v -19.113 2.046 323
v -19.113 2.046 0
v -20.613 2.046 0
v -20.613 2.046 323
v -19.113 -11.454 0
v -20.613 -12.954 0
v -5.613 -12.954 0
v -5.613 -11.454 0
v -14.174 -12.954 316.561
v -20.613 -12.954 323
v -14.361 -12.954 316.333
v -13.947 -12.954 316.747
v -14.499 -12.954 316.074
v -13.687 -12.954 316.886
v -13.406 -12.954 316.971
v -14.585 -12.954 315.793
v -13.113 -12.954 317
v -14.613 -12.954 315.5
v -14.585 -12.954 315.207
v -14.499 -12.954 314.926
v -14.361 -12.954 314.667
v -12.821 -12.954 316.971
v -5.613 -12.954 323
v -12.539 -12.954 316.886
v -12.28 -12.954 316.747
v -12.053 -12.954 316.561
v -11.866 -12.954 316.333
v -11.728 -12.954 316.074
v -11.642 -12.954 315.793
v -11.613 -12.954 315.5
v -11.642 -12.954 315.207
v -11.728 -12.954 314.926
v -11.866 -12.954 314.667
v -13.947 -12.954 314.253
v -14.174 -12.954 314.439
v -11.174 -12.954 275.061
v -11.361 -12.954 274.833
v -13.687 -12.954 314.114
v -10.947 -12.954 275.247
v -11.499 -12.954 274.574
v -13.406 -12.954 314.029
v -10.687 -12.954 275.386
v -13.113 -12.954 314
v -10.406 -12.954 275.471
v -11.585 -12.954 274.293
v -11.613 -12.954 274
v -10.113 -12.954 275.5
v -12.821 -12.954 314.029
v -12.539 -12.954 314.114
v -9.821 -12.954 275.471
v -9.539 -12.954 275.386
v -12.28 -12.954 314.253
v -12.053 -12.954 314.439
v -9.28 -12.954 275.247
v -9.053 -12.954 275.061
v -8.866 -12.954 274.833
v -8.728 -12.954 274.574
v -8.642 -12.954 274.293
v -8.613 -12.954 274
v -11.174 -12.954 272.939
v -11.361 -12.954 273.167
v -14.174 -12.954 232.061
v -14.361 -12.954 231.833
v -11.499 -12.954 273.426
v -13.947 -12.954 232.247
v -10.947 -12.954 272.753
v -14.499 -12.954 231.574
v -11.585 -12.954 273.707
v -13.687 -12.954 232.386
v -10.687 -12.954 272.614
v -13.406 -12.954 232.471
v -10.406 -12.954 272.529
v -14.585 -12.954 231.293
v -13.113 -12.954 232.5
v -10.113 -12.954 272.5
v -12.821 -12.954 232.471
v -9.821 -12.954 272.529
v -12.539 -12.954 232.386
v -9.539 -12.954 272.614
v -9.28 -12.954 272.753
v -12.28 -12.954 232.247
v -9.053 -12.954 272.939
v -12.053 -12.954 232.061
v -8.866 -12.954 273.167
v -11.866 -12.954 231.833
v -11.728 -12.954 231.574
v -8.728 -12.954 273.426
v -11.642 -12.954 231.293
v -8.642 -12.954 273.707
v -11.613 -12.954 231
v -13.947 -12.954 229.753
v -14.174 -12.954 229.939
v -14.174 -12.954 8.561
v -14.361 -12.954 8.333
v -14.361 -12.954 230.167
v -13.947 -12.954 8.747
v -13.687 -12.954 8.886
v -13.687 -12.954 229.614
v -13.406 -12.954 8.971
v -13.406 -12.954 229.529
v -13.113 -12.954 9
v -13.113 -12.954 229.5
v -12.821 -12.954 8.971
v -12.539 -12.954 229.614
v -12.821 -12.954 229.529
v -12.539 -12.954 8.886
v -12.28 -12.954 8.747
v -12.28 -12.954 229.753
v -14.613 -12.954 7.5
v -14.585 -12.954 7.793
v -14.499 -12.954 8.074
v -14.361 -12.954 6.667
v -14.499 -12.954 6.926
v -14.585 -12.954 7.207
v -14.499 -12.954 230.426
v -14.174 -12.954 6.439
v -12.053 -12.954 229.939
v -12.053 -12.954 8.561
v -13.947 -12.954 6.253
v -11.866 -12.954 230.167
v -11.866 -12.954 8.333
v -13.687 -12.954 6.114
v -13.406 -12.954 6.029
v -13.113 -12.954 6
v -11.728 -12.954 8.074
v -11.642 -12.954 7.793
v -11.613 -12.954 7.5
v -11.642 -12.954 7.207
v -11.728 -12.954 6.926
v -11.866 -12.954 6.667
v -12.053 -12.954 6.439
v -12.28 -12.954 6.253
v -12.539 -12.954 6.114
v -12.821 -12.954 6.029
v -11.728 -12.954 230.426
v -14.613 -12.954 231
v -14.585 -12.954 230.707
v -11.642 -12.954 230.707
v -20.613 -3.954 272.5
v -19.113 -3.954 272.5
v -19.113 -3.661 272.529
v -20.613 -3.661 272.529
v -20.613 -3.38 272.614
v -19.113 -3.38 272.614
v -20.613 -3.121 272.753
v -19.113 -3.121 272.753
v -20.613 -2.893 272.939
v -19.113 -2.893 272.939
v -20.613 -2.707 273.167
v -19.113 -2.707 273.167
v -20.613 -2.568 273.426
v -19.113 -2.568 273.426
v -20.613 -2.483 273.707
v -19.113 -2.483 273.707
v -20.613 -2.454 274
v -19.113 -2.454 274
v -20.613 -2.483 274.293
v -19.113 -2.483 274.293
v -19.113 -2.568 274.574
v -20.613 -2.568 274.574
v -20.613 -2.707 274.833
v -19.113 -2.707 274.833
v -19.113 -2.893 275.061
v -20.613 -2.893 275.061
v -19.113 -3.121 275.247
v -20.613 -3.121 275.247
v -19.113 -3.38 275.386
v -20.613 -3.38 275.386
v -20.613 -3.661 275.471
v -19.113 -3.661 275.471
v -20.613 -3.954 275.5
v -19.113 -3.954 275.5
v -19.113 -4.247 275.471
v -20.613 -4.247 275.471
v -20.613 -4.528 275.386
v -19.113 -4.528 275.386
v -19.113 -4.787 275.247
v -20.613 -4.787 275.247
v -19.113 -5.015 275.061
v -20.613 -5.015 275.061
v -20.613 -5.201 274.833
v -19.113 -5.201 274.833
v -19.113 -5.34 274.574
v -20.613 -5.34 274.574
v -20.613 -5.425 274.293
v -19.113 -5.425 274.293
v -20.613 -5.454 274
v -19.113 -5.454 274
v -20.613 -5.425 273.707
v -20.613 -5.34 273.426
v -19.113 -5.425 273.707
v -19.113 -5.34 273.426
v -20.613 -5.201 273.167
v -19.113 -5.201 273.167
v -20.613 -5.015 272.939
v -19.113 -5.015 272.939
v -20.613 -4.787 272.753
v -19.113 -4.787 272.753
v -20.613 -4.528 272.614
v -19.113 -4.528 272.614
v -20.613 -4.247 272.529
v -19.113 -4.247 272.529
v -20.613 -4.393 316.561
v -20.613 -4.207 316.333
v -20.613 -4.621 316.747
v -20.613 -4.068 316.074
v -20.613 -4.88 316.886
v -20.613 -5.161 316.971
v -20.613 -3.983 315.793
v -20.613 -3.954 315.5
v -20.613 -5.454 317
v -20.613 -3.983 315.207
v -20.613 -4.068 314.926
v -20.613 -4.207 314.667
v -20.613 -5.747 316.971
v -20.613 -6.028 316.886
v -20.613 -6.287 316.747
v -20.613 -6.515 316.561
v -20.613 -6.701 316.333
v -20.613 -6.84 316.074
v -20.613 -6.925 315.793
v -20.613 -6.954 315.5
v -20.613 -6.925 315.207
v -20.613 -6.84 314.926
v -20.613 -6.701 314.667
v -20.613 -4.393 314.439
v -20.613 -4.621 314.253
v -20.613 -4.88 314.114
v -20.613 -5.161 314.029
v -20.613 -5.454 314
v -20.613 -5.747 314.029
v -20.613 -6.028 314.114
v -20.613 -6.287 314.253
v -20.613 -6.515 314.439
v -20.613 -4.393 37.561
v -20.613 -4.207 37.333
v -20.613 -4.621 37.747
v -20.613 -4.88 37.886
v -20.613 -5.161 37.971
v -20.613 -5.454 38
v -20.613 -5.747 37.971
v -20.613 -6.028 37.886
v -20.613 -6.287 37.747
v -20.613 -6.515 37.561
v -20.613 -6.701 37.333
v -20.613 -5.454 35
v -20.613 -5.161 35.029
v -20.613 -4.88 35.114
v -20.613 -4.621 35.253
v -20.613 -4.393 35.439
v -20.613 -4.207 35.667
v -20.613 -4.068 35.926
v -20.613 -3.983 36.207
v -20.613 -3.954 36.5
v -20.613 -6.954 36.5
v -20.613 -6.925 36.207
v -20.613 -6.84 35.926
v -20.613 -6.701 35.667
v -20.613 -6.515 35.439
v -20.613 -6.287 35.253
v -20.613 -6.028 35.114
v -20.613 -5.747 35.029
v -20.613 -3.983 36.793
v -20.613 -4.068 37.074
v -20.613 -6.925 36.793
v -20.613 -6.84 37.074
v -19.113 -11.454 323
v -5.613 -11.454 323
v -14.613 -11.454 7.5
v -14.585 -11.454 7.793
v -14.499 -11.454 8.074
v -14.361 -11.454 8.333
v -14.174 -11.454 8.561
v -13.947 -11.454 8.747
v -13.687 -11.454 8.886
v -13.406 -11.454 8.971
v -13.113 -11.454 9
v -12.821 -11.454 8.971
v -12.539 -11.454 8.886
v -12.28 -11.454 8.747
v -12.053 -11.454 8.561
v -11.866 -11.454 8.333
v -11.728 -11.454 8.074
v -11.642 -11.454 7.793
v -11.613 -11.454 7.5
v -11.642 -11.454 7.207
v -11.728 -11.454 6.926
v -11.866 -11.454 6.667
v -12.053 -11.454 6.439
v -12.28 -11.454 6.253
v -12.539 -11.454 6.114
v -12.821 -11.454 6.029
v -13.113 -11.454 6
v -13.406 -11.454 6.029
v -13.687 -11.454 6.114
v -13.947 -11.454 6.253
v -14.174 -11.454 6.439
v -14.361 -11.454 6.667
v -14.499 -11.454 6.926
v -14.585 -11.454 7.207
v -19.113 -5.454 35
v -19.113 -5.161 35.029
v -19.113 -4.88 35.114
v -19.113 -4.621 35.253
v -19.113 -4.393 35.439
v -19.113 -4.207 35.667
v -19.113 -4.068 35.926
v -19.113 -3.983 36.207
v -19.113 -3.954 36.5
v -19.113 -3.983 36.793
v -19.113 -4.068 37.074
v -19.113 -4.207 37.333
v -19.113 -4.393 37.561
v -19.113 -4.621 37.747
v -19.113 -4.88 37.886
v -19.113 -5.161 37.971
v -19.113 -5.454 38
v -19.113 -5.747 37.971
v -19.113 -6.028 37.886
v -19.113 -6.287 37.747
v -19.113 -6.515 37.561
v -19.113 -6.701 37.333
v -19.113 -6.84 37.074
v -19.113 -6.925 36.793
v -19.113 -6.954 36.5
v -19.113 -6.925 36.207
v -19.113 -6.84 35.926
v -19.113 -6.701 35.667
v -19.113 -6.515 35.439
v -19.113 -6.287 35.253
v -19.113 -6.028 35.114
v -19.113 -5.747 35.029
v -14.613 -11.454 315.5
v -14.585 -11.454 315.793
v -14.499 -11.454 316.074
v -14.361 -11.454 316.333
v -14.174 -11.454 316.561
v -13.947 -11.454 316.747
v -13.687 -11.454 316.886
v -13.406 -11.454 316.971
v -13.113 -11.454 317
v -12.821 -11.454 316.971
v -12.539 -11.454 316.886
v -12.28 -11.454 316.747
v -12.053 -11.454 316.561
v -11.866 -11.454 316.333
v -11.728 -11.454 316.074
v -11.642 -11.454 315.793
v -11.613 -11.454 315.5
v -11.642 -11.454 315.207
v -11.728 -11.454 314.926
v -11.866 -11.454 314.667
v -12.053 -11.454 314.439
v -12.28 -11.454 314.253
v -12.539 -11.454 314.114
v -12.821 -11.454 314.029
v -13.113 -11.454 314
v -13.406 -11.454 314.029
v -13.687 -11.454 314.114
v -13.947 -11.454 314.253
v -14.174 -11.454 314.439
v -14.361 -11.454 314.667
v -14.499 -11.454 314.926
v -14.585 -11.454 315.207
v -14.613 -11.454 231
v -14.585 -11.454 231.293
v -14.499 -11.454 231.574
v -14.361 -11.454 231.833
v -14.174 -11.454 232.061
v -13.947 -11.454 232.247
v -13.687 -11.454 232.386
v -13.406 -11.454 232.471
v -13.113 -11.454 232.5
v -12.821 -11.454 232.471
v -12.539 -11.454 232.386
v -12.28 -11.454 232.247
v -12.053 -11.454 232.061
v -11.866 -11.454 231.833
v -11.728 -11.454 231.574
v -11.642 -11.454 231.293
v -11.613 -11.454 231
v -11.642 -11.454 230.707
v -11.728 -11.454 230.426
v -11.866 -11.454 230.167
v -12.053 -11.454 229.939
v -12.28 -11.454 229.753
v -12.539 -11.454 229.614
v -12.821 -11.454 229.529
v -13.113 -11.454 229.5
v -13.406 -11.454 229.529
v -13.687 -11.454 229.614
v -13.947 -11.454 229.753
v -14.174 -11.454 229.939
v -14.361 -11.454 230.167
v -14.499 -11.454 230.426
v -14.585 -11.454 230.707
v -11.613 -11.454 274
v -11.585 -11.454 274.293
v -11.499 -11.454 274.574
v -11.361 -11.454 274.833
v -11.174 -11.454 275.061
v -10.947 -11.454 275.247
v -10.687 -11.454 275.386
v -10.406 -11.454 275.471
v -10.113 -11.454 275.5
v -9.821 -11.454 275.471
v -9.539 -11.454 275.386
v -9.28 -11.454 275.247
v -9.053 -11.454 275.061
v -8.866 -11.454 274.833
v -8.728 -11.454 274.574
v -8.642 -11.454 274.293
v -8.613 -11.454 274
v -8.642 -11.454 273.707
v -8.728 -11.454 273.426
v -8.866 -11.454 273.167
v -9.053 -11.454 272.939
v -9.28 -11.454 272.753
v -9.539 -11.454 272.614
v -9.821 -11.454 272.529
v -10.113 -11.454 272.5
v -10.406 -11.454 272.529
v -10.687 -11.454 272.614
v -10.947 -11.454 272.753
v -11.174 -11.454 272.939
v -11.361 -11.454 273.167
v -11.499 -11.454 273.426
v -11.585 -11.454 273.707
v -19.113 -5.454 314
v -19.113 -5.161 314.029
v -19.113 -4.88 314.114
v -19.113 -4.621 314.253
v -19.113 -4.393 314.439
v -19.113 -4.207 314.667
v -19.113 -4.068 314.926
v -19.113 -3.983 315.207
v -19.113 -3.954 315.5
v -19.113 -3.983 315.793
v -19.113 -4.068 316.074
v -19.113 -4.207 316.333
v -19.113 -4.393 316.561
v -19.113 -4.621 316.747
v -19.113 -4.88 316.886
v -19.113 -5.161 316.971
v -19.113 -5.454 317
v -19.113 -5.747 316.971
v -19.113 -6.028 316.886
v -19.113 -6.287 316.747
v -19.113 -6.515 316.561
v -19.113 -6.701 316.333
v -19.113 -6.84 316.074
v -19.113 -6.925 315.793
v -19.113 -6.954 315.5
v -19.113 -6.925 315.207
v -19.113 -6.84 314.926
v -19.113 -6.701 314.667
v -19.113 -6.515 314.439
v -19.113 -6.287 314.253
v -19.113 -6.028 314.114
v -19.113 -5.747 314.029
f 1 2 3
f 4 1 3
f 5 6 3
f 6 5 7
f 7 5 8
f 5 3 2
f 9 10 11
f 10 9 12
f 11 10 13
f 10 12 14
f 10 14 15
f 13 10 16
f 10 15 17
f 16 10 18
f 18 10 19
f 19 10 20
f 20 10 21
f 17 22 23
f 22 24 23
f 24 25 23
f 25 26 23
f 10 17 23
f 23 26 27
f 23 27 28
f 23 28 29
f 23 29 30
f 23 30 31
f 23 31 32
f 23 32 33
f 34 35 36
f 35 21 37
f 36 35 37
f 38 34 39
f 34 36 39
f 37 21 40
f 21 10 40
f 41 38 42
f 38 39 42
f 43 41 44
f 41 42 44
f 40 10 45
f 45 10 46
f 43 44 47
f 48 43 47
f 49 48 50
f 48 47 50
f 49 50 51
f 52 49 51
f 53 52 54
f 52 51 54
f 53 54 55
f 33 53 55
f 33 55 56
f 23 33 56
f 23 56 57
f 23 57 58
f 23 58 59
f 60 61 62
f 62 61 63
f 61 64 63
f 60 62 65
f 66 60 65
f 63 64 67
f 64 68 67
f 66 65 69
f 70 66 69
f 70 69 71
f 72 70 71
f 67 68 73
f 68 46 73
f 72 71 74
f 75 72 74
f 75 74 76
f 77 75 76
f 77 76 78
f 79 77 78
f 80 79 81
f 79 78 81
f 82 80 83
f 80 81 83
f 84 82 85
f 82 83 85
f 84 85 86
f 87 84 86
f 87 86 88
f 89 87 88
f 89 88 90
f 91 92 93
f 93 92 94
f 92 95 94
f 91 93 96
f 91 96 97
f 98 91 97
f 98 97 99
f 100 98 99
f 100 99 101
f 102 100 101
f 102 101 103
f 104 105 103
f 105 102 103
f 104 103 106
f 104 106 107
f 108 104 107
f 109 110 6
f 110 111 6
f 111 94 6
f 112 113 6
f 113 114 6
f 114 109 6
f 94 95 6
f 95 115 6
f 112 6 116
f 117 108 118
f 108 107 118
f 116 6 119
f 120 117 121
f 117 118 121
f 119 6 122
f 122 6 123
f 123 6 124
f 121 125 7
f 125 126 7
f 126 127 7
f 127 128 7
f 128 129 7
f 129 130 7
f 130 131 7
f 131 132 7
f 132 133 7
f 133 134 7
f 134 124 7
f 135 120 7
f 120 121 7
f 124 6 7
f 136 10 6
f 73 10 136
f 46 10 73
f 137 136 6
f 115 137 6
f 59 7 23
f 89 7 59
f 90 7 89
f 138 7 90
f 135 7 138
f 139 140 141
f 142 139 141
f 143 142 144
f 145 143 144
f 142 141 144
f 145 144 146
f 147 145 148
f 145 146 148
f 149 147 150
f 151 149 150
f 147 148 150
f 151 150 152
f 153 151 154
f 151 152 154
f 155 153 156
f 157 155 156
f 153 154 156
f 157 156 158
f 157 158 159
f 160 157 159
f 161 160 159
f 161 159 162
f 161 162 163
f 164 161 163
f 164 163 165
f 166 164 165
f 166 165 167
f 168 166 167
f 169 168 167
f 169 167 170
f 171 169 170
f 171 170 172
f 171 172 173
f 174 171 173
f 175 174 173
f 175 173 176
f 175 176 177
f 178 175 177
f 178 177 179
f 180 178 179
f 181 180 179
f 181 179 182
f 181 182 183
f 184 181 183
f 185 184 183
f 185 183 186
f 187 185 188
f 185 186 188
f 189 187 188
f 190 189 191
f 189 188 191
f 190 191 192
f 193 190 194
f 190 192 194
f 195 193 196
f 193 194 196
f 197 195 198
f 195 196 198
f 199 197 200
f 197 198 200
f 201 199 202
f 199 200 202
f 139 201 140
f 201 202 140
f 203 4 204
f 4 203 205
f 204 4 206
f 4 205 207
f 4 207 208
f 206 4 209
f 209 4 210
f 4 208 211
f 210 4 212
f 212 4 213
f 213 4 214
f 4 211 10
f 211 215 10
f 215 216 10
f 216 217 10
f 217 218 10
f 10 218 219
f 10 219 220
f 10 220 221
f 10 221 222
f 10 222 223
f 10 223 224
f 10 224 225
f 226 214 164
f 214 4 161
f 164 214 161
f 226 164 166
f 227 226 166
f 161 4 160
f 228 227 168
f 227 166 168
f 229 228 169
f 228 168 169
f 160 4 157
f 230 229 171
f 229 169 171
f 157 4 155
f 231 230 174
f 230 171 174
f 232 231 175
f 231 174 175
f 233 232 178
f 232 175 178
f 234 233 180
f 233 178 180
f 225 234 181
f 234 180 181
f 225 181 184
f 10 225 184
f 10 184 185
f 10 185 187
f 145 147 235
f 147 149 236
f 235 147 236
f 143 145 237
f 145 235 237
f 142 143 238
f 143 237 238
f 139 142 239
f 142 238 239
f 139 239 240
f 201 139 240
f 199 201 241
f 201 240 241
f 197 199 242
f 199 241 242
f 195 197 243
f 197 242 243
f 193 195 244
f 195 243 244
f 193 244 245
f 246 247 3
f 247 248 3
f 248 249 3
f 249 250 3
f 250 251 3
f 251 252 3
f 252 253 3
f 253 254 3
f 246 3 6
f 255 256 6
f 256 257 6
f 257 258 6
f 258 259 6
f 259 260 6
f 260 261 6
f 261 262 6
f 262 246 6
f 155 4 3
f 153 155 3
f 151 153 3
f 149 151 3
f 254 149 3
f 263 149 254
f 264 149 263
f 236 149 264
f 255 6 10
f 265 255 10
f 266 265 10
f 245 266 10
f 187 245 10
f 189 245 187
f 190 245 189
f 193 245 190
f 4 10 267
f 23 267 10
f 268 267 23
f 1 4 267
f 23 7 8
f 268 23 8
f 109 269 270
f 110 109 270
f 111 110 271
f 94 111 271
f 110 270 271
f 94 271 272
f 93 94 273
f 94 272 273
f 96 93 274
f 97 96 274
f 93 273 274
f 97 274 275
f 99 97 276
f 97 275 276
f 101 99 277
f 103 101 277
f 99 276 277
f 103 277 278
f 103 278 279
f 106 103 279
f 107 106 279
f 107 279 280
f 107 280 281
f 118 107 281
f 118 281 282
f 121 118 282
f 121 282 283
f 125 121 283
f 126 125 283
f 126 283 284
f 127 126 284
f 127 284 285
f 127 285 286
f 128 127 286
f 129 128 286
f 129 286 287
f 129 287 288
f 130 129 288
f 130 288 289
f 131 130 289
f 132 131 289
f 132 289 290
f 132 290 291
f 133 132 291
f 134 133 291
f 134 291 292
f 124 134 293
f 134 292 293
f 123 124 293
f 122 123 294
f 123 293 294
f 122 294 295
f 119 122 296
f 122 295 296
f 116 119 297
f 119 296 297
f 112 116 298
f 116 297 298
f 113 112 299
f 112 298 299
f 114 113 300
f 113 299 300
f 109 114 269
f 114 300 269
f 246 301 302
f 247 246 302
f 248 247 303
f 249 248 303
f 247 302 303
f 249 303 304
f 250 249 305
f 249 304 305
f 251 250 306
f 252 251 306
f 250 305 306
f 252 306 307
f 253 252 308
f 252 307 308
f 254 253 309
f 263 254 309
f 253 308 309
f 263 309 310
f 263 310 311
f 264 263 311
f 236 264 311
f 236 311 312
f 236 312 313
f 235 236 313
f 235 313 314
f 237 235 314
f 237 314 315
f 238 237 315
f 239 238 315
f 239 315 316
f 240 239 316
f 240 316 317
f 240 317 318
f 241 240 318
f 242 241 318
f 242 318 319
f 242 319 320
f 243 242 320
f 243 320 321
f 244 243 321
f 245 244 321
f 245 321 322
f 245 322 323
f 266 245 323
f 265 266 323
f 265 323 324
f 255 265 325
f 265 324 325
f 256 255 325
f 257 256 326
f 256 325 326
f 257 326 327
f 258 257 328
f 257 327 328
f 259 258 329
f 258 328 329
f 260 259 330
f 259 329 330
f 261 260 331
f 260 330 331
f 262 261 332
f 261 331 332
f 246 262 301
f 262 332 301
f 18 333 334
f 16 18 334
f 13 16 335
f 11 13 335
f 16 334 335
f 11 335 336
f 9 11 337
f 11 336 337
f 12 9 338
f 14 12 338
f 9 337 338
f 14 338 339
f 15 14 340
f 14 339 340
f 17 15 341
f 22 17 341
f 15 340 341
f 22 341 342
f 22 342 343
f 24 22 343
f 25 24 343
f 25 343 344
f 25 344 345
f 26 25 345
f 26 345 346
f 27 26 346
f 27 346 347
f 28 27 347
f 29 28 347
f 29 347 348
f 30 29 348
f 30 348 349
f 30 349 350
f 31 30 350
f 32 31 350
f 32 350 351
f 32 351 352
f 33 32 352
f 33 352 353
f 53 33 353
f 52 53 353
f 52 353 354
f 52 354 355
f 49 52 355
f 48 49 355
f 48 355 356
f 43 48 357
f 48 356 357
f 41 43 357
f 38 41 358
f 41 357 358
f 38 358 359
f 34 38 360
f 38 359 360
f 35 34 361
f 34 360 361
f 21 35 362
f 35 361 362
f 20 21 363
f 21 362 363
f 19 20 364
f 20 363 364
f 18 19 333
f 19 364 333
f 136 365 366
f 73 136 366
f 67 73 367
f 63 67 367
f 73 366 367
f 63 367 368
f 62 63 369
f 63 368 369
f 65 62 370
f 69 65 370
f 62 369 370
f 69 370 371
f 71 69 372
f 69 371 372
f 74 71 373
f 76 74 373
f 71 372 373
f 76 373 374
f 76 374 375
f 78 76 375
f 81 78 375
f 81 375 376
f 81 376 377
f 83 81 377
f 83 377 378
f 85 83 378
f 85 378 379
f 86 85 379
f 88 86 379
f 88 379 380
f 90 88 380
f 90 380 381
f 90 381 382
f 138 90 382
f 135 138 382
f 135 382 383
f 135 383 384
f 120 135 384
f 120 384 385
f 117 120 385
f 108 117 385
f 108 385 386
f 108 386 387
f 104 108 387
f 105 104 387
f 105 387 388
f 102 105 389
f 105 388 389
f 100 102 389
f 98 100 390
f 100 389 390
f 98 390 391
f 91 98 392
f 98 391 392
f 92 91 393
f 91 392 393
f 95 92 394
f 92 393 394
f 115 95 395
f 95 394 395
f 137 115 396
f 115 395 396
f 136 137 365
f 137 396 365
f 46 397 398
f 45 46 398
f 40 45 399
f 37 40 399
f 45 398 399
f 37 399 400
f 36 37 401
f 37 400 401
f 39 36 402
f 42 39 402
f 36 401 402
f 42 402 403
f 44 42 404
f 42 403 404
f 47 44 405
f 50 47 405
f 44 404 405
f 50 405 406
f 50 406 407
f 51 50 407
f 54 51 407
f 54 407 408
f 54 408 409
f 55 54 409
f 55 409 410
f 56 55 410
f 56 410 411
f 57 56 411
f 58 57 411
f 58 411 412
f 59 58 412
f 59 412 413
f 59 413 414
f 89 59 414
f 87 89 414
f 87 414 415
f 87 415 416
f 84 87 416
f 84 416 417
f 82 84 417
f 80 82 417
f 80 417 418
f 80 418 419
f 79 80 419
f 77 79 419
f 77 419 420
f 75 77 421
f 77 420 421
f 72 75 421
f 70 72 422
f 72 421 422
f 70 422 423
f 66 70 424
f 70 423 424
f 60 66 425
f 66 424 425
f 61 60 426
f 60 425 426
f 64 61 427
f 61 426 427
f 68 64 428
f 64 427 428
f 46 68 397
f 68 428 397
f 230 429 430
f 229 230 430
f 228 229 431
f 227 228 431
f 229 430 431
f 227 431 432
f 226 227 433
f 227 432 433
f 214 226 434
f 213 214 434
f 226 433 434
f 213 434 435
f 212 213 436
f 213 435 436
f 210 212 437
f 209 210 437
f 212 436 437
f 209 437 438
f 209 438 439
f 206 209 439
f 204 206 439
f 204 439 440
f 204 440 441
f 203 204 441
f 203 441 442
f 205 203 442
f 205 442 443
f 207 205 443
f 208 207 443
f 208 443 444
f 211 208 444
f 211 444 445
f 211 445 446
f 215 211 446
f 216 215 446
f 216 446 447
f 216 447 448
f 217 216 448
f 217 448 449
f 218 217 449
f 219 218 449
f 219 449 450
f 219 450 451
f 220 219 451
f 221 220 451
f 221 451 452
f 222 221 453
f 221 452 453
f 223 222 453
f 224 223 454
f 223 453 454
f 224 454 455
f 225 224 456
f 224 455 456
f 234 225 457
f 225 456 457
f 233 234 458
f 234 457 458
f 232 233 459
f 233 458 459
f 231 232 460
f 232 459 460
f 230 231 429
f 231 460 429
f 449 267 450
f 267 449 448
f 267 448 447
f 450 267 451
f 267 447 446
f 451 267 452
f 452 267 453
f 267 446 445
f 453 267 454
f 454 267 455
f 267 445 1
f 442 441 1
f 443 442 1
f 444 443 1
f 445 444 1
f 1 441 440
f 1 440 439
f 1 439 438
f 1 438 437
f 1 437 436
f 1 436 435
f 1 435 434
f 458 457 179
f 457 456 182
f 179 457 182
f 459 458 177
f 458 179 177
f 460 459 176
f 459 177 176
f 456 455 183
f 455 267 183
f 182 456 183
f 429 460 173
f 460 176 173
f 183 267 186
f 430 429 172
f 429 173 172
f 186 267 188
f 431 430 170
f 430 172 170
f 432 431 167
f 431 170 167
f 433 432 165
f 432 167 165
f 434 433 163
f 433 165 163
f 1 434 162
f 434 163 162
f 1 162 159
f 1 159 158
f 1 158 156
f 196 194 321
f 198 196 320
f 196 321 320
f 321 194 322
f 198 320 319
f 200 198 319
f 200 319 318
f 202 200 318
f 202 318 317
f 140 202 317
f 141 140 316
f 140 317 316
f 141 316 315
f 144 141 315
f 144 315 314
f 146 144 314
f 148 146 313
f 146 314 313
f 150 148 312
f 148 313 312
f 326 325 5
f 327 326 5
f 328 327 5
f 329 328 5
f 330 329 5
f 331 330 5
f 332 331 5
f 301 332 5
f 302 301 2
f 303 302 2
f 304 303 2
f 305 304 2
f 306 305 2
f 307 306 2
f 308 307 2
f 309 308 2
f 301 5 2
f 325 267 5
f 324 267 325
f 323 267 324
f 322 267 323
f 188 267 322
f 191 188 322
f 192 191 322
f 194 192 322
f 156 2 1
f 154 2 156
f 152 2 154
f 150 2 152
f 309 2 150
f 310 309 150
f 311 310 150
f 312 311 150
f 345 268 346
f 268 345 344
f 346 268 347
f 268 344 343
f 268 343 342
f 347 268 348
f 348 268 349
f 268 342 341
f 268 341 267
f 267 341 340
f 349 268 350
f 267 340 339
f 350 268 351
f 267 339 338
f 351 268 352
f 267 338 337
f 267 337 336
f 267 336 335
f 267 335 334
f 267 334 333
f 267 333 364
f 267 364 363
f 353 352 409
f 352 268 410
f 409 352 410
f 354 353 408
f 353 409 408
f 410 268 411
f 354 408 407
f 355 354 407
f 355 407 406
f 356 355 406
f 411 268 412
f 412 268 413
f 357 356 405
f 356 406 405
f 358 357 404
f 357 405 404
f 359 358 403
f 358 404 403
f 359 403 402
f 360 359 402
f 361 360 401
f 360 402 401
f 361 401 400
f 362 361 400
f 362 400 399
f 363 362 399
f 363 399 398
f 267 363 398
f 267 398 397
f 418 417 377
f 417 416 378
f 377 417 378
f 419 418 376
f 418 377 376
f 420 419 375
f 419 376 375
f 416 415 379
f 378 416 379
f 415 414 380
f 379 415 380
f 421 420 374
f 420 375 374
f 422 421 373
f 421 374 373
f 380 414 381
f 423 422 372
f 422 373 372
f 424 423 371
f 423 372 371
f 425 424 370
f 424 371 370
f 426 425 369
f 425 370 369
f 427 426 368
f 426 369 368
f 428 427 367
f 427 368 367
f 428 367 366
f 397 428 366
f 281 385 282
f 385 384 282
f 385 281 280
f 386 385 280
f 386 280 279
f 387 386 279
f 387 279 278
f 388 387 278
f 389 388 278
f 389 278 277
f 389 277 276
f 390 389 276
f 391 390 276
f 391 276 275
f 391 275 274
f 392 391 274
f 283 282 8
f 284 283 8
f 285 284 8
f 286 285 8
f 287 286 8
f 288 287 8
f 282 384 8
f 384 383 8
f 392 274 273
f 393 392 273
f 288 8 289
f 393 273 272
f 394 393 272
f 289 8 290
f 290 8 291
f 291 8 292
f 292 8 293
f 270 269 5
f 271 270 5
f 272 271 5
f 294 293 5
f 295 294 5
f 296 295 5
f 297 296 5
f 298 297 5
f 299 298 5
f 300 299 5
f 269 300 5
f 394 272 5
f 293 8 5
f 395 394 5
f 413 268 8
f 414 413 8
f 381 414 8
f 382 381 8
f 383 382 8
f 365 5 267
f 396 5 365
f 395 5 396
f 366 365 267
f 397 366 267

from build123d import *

# Parameters (mm, degrees)
EXTRUSION1_DEPTH = 323
ESQUISSE2_R      = 1.5
EXTRUSION2_DEPTH = 248
ESQUISSE3_R      = 1.5
EXTRUSION3_DEPTH = 248


with BuildPart() as part:
    # Esquisse1 → Extrusion1 (new body)
    with BuildSketch(Plane.XY):
        Polygon((-20.61337059, 2.046), (-20.61337059, -12.954), (-5.61337059, -12.954), (-5.61337059, -11.454), (-19.11337059, -11.454), (-19.11337059, 2.046), align=None)
    extrude(amount=EXTRUSION1_DEPTH)

    # Esquisse2 → Extrusion2 (cut)
    with BuildSketch(Plane(origin=(0, -11.454, 0), x_dir=(-1, 0, 0), z_dir=(0, 1, 0))):
        with Locations((13.11337059, 7.5)):
            Circle(ESQUISSE2_R)
        with Locations((10.11337059, 274)):
            Circle(ESQUISSE2_R)
        with Locations((13.11337059, 315.5)):
            Circle(ESQUISSE2_R)
        with Locations((13.11337059, 231)):
            Circle(ESQUISSE2_R)
    extrude(amount=-EXTRUSION2_DEPTH, mode=Mode.SUBTRACT)

    # Esquisse3 → Extrusion3 (cut)
    with BuildSketch(Plane(origin=(-19.11337059, 0, 0), x_dir=(0, 0, -1), z_dir=(1, 0, 0))):
        with Locations((-36.5, -5.454)):
            Circle(ESQUISSE3_R)
        with Locations((-274, -3.954)):
            Circle(ESQUISSE3_R)
        with Locations((-315.5, -5.454)):
            Circle(ESQUISSE3_R)
    extrude(amount=-EXTRUSION3_DEPTH, mode=Mode.SUBTRACT)


solid = part.part
